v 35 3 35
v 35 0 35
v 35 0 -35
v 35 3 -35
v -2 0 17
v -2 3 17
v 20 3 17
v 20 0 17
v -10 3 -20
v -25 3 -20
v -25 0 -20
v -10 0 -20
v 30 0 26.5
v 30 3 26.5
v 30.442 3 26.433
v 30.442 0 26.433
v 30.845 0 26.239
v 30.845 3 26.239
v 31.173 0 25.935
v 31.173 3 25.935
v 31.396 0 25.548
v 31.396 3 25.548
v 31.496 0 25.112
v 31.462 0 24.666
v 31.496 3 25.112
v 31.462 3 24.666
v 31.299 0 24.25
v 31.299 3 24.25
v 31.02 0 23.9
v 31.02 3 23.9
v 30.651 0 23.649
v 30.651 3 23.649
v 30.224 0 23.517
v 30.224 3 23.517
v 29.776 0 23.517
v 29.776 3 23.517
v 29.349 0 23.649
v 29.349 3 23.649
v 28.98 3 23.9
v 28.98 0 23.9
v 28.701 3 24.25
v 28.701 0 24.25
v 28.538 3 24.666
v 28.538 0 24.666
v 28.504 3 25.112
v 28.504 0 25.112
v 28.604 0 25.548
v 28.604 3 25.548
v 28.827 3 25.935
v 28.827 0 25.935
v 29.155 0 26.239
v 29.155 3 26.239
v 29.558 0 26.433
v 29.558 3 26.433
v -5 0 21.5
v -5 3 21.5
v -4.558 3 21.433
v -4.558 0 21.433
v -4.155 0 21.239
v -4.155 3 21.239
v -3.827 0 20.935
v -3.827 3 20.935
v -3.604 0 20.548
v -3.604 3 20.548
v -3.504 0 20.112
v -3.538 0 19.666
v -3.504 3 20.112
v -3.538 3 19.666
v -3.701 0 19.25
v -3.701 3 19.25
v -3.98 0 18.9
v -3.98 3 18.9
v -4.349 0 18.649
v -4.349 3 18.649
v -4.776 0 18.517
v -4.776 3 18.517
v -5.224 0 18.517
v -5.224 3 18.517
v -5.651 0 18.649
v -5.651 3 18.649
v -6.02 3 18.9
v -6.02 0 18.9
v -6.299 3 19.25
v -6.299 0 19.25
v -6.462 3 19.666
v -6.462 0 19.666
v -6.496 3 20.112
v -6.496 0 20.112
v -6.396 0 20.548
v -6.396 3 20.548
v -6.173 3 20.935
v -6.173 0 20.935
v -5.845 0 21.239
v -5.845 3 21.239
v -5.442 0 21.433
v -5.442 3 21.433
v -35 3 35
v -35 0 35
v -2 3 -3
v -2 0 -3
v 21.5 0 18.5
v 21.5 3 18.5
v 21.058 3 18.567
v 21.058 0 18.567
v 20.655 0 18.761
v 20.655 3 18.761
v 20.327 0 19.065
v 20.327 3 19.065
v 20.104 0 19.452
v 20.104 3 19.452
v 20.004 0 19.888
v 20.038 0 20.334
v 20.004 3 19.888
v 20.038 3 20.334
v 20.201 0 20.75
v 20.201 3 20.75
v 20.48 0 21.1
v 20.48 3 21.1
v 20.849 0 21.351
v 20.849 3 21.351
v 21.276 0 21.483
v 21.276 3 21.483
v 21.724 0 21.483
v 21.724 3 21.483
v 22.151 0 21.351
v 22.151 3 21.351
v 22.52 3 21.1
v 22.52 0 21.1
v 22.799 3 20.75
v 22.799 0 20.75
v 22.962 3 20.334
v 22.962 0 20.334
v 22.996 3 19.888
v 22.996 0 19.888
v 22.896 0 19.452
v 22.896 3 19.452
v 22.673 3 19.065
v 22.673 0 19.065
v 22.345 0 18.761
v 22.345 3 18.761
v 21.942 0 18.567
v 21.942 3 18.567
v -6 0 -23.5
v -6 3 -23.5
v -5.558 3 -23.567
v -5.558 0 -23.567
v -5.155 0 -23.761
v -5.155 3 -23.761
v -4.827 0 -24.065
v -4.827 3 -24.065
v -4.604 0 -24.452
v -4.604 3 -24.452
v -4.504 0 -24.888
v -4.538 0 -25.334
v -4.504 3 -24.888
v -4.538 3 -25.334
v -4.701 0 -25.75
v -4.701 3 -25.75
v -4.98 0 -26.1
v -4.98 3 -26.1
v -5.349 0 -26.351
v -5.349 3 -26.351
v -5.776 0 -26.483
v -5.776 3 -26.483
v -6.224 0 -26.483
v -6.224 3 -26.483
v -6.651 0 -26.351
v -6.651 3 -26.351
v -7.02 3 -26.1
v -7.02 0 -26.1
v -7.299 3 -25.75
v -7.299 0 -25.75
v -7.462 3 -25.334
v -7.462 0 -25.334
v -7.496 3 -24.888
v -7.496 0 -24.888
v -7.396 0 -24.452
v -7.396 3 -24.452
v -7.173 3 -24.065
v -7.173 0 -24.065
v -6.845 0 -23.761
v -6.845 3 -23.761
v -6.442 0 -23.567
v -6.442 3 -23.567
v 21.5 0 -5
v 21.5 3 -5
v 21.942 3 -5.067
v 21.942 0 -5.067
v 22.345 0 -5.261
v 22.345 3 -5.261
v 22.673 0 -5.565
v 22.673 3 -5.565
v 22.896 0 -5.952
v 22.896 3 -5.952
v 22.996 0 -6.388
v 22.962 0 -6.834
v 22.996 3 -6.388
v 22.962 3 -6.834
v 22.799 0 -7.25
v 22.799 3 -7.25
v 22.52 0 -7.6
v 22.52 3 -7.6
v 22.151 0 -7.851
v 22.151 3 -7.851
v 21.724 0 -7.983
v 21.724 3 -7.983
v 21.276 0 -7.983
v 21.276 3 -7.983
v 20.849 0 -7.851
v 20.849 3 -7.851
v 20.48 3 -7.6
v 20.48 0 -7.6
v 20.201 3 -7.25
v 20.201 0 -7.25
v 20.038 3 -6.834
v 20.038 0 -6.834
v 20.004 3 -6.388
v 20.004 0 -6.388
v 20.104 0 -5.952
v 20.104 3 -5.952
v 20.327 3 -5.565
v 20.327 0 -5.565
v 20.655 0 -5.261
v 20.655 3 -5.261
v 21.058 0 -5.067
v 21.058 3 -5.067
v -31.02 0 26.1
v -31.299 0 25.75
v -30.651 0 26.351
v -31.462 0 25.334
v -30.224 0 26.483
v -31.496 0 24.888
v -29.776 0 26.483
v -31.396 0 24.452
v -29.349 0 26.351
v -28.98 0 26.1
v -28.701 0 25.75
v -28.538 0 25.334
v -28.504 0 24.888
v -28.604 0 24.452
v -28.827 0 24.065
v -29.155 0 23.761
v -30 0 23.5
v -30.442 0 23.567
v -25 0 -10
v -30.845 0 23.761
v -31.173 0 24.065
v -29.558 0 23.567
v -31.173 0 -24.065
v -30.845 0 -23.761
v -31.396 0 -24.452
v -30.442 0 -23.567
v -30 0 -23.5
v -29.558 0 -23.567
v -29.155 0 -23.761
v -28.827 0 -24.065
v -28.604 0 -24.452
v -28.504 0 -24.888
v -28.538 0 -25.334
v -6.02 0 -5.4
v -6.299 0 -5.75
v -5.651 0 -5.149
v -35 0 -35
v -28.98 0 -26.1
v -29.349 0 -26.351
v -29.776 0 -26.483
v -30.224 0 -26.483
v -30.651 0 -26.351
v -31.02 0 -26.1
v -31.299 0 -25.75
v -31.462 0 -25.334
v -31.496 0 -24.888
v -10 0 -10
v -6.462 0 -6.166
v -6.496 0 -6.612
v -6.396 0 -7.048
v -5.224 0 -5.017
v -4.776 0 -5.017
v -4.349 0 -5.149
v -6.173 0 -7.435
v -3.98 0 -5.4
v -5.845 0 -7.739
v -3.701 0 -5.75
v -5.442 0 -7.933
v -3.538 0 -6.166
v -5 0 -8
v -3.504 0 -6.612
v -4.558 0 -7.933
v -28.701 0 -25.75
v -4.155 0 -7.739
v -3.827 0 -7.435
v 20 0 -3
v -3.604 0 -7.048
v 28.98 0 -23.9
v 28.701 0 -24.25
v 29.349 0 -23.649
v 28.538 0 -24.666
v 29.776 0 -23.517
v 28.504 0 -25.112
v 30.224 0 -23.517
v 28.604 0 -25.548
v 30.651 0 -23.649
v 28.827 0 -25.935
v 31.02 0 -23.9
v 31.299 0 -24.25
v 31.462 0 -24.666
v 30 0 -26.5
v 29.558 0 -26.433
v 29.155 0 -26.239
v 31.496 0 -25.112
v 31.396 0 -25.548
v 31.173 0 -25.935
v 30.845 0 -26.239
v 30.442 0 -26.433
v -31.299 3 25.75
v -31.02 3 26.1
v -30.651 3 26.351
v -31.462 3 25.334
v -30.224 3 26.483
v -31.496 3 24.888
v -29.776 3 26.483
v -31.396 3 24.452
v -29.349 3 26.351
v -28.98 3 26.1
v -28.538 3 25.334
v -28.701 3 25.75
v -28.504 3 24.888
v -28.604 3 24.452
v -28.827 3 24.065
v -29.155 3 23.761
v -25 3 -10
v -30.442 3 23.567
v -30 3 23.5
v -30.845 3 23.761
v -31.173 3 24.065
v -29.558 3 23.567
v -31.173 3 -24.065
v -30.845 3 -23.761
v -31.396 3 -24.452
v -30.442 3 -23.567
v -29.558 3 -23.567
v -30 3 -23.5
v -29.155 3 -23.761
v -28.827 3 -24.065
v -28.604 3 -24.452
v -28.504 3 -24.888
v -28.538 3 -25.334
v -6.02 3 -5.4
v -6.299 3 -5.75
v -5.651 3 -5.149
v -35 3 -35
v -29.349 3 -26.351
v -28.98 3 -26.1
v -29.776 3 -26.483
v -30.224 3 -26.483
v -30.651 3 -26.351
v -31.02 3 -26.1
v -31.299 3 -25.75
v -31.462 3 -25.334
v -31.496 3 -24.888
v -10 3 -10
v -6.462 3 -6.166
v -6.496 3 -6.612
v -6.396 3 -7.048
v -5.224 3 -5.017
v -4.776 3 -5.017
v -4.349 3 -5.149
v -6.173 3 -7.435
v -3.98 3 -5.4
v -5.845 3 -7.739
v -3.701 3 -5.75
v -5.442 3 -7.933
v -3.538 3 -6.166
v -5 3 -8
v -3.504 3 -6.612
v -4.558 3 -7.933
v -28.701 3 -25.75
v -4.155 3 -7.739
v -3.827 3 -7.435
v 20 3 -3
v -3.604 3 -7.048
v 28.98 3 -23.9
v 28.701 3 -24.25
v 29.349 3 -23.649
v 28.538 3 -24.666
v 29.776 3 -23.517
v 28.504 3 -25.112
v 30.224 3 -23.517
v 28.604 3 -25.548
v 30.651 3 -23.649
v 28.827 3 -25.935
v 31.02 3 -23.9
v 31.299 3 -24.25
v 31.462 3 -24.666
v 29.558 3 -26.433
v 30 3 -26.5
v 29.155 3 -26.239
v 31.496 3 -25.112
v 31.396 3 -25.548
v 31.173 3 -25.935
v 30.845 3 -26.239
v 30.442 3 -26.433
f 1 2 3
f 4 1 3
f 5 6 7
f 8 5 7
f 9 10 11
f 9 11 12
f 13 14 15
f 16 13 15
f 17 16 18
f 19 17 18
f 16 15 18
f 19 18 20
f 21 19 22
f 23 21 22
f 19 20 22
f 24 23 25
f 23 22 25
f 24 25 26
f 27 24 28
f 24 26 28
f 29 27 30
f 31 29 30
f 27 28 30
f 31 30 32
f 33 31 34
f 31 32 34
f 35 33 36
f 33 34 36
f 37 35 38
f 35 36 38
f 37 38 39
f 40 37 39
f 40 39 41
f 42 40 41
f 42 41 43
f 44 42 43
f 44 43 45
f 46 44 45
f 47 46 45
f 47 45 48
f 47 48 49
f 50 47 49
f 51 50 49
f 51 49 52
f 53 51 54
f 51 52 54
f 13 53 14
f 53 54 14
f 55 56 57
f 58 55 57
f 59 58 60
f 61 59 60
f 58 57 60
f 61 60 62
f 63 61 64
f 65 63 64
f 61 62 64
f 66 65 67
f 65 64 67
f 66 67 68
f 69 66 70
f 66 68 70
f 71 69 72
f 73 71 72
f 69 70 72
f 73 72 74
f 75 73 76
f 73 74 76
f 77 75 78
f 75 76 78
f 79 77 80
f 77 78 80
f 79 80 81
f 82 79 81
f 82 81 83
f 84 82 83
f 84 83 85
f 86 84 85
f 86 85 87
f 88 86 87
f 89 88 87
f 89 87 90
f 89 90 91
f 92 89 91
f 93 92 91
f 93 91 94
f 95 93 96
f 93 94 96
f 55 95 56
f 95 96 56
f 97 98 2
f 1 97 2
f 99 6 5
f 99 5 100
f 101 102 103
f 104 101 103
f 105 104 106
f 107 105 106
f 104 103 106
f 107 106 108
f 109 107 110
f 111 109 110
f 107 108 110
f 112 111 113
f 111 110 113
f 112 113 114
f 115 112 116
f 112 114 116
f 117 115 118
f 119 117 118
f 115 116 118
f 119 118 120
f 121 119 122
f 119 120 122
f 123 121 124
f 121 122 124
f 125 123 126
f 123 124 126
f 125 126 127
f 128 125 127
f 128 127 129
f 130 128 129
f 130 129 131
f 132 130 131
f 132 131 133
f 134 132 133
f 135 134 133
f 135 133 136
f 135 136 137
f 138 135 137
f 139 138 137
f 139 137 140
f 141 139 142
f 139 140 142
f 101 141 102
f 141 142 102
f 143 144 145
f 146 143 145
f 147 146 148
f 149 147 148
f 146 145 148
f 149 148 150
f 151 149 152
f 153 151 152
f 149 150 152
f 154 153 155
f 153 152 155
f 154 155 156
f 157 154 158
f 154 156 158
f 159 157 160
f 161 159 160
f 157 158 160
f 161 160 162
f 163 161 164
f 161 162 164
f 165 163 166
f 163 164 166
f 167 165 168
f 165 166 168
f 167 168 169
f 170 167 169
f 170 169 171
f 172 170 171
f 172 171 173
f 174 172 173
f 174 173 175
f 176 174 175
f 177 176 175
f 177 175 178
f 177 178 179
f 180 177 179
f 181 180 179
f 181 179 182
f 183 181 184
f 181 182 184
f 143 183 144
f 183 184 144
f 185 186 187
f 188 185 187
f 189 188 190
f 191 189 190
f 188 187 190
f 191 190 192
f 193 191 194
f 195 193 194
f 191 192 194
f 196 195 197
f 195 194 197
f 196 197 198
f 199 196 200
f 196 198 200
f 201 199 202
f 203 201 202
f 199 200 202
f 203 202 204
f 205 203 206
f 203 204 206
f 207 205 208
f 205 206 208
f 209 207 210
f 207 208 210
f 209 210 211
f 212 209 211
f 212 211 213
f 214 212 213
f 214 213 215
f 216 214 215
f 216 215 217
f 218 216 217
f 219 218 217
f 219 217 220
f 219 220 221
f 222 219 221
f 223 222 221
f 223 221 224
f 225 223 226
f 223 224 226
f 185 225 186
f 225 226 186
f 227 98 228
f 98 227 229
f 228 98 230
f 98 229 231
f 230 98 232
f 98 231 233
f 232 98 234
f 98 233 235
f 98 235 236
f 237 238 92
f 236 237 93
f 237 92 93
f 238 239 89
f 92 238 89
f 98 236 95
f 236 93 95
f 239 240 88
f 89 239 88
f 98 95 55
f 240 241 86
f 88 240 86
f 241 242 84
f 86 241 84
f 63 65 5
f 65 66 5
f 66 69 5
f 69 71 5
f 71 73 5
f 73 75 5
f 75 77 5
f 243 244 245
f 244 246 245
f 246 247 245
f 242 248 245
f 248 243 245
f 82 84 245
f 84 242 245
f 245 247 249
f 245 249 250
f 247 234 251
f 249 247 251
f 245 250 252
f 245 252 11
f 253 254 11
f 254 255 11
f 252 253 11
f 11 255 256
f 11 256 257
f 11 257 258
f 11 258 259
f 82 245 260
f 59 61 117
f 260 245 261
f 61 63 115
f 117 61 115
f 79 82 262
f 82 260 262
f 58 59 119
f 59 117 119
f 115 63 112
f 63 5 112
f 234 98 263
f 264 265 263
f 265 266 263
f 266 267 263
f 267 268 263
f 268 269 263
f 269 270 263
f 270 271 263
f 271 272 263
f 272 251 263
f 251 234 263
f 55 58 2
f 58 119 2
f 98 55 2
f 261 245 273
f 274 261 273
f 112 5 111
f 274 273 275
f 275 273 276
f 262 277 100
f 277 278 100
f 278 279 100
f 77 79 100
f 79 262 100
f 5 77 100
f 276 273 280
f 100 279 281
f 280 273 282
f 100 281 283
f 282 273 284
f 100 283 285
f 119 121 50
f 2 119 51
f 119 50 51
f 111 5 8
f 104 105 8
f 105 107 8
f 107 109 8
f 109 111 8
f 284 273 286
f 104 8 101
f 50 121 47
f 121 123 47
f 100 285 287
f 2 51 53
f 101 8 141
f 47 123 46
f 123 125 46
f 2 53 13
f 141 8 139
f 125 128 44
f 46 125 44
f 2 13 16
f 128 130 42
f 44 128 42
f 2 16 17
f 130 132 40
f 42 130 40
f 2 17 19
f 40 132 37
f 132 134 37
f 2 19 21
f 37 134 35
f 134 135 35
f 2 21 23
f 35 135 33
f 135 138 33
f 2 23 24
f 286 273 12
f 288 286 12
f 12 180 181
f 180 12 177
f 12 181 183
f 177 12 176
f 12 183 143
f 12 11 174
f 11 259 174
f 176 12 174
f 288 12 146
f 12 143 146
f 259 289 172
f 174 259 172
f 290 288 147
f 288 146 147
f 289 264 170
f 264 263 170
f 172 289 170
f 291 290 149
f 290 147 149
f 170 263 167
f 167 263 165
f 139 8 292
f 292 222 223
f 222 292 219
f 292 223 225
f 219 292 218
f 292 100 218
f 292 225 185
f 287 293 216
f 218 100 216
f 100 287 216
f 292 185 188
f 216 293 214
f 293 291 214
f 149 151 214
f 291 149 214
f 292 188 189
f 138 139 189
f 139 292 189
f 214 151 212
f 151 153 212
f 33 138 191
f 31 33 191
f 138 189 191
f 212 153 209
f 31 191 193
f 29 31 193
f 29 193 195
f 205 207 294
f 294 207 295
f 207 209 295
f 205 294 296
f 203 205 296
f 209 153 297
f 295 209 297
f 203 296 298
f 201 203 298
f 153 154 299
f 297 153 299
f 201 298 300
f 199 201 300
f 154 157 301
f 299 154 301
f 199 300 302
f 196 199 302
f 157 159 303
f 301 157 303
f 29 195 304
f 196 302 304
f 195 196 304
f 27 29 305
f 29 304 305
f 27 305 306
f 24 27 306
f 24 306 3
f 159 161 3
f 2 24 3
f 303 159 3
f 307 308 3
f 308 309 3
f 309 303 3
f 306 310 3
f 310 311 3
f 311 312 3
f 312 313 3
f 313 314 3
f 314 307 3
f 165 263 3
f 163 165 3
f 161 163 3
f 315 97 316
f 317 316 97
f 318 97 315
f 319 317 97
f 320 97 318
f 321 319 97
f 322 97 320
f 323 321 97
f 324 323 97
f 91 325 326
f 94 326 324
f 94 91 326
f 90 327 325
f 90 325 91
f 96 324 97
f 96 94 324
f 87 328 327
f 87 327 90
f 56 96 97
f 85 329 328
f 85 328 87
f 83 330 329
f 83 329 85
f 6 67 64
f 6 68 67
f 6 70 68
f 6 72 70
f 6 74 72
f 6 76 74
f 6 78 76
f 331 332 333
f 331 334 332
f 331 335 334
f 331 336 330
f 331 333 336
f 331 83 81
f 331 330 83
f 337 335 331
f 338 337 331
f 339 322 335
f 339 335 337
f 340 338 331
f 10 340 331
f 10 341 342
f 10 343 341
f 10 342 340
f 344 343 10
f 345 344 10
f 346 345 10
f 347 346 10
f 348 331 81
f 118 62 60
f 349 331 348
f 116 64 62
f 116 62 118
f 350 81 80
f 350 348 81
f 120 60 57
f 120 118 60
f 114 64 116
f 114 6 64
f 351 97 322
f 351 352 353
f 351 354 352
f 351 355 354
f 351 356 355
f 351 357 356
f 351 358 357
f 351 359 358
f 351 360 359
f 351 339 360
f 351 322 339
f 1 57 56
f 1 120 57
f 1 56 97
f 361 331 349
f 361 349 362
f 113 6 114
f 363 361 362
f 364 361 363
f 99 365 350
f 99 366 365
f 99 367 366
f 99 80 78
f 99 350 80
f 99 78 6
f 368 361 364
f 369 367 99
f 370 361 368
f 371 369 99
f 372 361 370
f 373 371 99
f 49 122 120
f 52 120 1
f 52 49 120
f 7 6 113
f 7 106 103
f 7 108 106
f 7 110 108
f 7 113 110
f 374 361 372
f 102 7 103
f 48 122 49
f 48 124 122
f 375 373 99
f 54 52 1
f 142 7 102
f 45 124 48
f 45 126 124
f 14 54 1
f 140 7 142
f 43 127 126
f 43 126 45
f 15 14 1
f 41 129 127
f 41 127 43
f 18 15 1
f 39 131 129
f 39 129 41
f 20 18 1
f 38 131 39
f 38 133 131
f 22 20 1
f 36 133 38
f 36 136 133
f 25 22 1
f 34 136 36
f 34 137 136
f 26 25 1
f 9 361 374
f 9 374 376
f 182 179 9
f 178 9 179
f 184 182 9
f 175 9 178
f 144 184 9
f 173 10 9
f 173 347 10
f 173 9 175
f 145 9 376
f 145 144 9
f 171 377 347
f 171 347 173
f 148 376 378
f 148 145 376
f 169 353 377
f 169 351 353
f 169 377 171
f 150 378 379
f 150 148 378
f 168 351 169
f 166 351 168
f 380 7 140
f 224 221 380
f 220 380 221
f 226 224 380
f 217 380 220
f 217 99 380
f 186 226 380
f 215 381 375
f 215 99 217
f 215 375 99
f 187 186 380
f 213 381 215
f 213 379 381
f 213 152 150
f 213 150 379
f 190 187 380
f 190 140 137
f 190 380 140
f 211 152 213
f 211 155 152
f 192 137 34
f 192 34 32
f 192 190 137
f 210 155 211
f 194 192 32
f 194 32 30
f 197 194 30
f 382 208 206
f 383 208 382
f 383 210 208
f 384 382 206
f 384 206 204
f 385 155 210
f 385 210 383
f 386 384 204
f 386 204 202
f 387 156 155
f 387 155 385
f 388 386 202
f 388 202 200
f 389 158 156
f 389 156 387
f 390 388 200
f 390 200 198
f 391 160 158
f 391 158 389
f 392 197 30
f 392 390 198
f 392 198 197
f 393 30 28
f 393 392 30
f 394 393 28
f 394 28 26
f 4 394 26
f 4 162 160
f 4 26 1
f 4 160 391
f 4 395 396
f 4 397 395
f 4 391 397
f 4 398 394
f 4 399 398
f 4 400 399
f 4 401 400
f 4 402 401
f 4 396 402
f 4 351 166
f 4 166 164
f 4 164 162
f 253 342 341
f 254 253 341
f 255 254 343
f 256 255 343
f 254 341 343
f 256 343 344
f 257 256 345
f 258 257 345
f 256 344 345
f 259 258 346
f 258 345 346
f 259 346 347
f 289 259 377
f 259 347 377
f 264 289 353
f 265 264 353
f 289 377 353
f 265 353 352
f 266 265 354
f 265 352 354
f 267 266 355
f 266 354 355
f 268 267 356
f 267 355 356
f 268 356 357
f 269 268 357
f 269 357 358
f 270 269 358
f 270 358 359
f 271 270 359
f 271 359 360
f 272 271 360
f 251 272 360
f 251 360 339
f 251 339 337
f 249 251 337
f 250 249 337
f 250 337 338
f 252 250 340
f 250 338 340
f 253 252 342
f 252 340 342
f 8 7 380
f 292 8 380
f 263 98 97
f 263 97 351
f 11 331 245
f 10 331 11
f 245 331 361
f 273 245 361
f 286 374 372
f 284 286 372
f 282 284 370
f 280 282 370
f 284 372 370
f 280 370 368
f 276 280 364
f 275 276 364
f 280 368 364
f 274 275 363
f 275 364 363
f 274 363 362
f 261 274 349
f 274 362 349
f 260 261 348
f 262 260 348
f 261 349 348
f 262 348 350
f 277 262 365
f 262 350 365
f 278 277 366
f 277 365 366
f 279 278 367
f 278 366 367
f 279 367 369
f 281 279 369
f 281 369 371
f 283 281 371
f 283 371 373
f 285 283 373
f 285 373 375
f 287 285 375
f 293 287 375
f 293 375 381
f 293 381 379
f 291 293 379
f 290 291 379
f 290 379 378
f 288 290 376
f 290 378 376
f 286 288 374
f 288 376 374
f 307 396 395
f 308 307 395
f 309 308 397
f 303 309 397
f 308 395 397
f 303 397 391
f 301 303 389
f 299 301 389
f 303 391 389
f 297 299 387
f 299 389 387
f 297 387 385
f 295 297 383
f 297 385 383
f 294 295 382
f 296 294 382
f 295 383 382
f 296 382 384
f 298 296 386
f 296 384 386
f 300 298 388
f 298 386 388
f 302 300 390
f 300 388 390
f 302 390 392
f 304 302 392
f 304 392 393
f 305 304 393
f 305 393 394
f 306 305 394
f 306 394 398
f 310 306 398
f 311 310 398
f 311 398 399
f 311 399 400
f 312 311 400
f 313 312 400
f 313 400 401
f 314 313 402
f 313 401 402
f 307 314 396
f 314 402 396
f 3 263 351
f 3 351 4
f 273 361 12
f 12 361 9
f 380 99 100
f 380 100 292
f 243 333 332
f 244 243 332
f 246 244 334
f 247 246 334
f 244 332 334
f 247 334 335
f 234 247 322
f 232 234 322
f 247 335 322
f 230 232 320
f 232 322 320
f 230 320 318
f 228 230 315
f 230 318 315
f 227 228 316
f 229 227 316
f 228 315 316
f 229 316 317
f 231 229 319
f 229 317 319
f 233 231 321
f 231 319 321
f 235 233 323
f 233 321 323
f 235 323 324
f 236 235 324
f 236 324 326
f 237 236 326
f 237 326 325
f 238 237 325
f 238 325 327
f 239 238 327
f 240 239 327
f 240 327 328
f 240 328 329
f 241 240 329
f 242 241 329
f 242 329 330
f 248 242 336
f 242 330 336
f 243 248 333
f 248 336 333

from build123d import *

# Parameters (mm, degrees)
SKETCH1_W           = 70
SKETCH1_H           = 70
BOSS_EXTRUDE1_DEPTH = 3
SKETCH2_R           = 1.5
CUT_EXTRUDE1_DEPTH  = 3
SKETCH3_R           = 1.5
SKETCH3_W           = 15
SKETCH3_H           = 10
SKETCH3_W_2         = 22
SKETCH3_H_2         = 20
CUT_EXTRUDE2_DEPTH  = 3


with BuildPart() as part:
    # Sketch1 → Boss-Extrude1 (new body)
    with BuildSketch(Plane(origin=(0, 0, 0), x_dir=(1, 0, 0), z_dir=(0, 1, 0))):
        Rectangle(SKETCH1_W, SKETCH1_H)
    extrude(amount=BOSS_EXTRUDE1_DEPTH)

    # Sketch2 → Cut-Extrude1 (cut)
    with BuildSketch(Plane(origin=(0, 3, 0), x_dir=(1, 0, 0), z_dir=(0, 1, 0))):
        with Locations(Location((-30, 25, 0), (0, 0, 270))):
            Circle(SKETCH2_R)
        with Locations(Location((30, 25, 0), (0, 0, 90))):
            Circle(SKETCH2_R)
        with Locations(Location((30, -25, 0), (0, 0, 270))):
            Circle(SKETCH2_R)
        with Locations(Location((-30, -25, 0), (0, 0, 90))):
            Circle(SKETCH2_R)
    extrude(amount=-CUT_EXTRUDE1_DEPTH, mode=Mode.SUBTRACT)

    # Sketch3 → Cut-Extrude2 (cut)
    with BuildSketch(Plane(origin=(0, 3, 0), x_dir=(1, 0, 0), z_dir=(0, 1, 0))):
        with Locations(Location((21.5, 6.5, 0), (0, 0, 270))):
            Circle(SKETCH3_R)
        with Locations(Location((21.5, -20, 0), (0, 0, 90))):
            Circle(SKETCH3_R)
        with Locations(Location((-5, -20, 0), (0, 0, 270))):
            Circle(SKETCH3_R)
        with Locations(Location((-6, 25, 0), (0, 0, 270))):
            Circle(SKETCH3_R)
        with Locations(Location((-5, 6.5, 0), (0, 0, 90))):
            Circle(SKETCH3_R)
        with Locations((-17.5, 15)):
            Rectangle(SKETCH3_W, SKETCH3_H)
        with Locations((9, -7)):
            Rectangle(SKETCH3_W_2, SKETCH3_H_2)
    extrude(amount=-CUT_EXTRUDE2_DEPTH, mode=Mode.SUBTRACT)


solid = part.part
